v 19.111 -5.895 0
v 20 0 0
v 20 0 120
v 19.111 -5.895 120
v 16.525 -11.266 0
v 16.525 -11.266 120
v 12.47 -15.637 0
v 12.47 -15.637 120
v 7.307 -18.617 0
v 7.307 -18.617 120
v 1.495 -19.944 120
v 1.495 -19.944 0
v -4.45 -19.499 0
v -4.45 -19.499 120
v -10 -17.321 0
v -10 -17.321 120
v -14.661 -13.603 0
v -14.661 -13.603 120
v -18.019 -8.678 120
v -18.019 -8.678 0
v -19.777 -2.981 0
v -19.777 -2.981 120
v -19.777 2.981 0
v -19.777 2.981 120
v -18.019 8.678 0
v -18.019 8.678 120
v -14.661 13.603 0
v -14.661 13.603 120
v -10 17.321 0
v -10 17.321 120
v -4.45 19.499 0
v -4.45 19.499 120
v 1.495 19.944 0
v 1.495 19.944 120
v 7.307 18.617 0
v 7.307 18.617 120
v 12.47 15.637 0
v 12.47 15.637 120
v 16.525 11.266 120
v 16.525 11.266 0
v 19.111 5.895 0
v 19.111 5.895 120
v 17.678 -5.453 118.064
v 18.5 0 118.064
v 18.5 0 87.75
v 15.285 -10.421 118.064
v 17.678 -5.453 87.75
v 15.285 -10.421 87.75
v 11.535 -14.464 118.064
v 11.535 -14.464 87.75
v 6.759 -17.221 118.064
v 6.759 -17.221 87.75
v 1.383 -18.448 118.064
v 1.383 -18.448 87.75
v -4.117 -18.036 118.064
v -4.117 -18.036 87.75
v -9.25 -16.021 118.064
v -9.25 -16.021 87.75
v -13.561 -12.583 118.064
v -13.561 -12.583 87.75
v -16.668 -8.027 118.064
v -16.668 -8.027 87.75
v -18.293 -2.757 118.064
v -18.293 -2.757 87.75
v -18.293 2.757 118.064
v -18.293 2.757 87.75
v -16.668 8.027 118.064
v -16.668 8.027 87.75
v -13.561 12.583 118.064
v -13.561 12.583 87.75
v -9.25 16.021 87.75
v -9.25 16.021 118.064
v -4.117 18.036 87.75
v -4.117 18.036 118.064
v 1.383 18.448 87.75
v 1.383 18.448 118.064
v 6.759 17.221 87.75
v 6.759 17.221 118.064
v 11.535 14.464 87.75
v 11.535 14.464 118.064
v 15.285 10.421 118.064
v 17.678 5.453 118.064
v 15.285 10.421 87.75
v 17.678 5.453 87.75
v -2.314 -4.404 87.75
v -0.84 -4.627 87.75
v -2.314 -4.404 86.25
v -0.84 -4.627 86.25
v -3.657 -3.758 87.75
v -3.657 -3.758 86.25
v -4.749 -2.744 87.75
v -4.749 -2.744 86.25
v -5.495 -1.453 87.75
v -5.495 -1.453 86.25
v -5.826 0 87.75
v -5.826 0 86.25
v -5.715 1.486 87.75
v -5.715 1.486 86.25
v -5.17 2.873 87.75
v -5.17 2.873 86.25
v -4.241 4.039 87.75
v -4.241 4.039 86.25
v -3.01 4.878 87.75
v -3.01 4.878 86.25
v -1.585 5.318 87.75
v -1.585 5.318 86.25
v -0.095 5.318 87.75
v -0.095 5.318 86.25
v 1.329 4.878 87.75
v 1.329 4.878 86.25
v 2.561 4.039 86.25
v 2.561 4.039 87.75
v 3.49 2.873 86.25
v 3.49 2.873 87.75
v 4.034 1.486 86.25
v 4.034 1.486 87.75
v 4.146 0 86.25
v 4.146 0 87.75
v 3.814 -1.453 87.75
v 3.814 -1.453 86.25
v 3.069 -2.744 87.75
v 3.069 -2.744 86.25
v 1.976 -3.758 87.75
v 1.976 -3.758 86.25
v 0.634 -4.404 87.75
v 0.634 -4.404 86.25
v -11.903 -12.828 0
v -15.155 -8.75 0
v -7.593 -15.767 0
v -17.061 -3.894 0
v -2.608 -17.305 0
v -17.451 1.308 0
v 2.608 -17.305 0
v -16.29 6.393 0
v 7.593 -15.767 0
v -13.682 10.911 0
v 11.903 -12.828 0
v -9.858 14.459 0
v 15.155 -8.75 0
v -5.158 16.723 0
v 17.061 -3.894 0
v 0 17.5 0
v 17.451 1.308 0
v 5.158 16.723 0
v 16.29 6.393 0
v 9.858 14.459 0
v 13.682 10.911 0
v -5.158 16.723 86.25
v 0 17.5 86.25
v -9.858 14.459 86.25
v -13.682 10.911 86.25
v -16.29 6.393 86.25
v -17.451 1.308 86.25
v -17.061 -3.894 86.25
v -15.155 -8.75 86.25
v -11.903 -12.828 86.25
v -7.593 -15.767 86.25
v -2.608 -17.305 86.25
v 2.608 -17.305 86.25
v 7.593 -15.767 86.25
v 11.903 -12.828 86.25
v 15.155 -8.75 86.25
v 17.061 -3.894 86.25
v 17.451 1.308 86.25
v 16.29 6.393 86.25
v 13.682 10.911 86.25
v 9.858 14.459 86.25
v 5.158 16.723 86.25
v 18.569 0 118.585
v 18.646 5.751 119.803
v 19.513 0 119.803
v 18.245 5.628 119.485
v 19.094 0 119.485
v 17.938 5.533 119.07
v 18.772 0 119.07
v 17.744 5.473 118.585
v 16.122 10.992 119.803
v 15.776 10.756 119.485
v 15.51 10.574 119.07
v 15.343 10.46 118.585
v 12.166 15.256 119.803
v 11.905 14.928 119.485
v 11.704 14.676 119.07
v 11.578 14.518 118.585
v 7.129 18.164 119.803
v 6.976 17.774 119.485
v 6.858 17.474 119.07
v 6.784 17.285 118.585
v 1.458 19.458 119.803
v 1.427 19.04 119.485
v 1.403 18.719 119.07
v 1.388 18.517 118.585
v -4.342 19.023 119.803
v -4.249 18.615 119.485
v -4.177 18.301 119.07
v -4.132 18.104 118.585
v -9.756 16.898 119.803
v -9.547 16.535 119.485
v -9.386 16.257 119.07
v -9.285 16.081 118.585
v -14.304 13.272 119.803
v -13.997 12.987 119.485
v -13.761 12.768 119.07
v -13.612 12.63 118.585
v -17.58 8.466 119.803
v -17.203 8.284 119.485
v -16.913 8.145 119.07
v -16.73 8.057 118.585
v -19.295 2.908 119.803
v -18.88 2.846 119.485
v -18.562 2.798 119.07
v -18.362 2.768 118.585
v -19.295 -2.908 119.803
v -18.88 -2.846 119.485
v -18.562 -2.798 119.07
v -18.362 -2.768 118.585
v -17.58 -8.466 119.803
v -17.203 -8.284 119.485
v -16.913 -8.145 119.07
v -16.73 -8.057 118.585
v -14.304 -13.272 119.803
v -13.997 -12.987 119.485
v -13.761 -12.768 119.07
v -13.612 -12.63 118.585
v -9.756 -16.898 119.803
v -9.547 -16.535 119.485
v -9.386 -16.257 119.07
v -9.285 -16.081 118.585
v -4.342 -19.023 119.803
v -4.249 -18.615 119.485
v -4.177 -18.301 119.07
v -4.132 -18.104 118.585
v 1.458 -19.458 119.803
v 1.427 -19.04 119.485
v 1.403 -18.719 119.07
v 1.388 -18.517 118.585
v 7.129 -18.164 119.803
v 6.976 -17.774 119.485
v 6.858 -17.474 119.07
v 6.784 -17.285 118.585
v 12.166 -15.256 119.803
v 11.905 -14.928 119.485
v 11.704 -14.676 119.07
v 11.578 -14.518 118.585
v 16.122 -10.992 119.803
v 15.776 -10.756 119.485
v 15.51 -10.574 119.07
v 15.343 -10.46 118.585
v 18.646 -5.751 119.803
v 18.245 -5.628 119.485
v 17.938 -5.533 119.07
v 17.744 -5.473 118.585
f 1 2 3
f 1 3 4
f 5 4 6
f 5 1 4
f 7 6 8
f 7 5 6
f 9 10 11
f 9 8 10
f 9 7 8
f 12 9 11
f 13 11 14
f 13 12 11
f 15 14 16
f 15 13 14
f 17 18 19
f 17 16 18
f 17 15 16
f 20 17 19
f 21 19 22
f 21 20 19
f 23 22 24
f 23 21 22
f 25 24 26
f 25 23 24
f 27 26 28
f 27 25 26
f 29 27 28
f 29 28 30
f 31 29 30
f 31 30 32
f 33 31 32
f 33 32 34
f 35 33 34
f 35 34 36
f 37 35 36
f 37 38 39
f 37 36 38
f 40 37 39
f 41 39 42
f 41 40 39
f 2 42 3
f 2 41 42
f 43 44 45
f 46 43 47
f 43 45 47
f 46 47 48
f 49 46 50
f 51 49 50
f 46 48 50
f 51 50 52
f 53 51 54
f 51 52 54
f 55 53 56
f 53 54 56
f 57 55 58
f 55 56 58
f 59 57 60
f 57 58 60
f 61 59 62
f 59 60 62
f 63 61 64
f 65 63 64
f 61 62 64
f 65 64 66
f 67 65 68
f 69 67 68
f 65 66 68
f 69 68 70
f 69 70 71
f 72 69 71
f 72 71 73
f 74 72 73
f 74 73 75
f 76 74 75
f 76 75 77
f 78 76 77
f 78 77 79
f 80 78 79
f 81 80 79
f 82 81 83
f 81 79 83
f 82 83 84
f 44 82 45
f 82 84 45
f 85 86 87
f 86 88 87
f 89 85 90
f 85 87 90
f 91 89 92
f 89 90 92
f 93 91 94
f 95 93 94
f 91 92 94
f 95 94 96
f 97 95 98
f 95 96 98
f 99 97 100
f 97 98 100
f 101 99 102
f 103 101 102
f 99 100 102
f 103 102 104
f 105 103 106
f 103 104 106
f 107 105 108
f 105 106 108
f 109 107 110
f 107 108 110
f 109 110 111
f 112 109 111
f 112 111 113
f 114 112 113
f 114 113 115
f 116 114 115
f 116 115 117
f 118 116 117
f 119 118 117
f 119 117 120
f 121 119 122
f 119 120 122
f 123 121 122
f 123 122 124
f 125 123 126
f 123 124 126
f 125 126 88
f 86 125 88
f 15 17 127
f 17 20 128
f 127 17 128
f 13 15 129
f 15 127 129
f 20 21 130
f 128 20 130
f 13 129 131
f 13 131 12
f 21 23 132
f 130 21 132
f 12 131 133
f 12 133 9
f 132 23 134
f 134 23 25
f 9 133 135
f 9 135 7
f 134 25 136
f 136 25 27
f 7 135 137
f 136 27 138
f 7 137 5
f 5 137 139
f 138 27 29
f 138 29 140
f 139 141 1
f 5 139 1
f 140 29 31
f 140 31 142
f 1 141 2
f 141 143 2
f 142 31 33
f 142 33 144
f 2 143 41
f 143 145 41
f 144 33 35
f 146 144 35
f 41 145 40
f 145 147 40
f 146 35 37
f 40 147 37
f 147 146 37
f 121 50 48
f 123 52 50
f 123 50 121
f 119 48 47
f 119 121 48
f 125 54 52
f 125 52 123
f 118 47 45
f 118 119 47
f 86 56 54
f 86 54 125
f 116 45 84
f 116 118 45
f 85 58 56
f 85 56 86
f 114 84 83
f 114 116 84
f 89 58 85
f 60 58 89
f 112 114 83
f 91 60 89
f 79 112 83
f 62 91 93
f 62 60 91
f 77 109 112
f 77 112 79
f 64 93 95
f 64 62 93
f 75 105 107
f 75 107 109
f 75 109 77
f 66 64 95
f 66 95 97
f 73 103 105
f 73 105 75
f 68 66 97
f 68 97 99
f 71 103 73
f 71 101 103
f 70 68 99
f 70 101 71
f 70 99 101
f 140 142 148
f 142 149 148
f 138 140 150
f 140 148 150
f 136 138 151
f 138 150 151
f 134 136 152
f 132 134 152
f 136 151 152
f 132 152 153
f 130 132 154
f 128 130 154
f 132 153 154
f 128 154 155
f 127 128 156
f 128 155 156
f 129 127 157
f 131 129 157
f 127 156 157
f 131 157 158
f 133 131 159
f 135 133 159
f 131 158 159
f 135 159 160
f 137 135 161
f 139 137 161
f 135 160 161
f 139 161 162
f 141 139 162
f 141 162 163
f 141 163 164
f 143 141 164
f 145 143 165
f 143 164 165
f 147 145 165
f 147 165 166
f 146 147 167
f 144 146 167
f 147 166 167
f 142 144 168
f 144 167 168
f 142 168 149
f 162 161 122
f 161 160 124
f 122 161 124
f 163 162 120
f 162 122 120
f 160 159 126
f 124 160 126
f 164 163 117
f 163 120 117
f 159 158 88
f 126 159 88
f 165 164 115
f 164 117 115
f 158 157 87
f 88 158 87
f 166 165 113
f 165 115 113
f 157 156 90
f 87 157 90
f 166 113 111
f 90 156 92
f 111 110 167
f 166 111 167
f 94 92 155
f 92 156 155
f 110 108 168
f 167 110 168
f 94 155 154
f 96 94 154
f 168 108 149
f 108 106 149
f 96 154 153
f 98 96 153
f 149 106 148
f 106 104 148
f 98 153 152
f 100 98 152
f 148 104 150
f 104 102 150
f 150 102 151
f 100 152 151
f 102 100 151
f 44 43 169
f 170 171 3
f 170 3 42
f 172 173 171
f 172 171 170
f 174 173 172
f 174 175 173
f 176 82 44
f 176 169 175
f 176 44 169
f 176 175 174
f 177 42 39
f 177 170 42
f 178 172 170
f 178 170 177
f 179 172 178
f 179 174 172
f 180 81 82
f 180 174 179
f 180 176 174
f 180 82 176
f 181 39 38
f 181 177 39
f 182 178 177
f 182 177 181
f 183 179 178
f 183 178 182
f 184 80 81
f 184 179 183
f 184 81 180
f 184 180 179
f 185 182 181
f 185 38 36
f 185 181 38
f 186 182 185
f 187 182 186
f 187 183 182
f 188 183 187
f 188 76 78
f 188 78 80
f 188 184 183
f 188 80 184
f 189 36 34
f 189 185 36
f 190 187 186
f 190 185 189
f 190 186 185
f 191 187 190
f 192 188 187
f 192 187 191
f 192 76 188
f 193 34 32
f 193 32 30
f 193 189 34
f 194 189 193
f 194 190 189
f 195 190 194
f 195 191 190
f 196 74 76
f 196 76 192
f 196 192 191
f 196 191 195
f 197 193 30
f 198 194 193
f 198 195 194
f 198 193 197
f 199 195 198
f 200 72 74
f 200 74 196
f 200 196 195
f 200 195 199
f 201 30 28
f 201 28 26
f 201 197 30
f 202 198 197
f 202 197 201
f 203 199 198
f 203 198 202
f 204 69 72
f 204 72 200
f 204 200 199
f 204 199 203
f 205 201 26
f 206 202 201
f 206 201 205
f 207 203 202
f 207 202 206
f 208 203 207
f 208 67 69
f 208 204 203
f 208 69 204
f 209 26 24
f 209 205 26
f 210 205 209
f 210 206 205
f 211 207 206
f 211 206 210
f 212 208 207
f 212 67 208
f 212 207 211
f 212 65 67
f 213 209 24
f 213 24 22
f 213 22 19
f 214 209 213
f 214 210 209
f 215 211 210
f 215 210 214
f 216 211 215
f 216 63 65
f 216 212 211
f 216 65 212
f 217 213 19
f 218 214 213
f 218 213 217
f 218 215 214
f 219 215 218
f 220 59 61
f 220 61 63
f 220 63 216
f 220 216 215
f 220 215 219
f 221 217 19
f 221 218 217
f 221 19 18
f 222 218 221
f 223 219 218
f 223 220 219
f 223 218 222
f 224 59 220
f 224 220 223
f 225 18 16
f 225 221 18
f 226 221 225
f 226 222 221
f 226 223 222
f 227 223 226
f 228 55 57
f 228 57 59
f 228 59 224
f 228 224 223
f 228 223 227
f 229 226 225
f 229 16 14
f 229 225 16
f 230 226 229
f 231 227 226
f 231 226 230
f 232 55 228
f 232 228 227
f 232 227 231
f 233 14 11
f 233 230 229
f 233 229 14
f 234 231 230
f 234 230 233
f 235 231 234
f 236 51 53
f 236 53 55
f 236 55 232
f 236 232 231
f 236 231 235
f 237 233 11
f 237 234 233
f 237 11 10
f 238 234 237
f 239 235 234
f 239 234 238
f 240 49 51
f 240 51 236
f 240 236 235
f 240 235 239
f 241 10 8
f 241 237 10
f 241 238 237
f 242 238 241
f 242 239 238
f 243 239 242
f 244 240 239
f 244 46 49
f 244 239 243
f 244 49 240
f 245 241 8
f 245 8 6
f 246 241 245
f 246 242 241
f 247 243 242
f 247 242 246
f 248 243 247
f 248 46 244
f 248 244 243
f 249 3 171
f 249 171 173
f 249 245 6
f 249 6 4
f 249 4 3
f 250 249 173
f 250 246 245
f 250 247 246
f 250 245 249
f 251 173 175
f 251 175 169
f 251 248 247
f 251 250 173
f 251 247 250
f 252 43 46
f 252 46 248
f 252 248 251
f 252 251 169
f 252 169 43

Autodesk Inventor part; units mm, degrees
ref_plane "YZ Plane" through (0, 0, 0) normal (1, 0, 0) x (0, 1, 0)
ref_plane "XZ Plane" through (0, 0, 0) normal (0, 1, 0) x (-1, 0, 0)
ref_plane "XY Plane" through (0, 0, 0) normal (0, 0, 1) x (1, 0, 0)
sketch "Sketch1" plane through (0, 0, 0) normal (0, 0, 1) x (1, 0, 0)
  circle A0 centre (0, 0) radius 20
  dimension "d0" = 40
extrude "Extrusion1" add sketch "Sketch1" along normal blind 120
sketch "Sketch2" plane through (0, 0, 0) normal (0, 0, -1) x (-1, 0, 0)
  point P0 (0, 0)
  point P1 (0, 0)
hole "Hole1" at (0, 0, 0) at (0, 0, 0) direction (0, 0, 1) diameter 35 depth 86.25
shell "Shell1" thickness 1.5 removed faces 1 at (-2.364, 6.2334, 120)
sketch "Sketch3" plane through (0, 0, 87.75) normal (0, 0, 1) x (1, 0, 0)
  point P0 (0, 0)
  point P1 (-0.8402, 0.3734)
hole "Hole2" at (-0.8402, 0.3734, 87.75) direction (0, 0, -1) diameter 10 depth 86.25
fillet "Fillet1" radius 2 1 edges at (-18.5, 0, 120)
thread "Thread1" size "M40x3" class "6g" standard "ANSI Metric M Profile" length 25
thread "Thread2" size "M38x1.5" class "6H" standard "ANSI Metric M Profile" length 10
properties part number "badan lampu" material "Aluminum 6061-AHC"
